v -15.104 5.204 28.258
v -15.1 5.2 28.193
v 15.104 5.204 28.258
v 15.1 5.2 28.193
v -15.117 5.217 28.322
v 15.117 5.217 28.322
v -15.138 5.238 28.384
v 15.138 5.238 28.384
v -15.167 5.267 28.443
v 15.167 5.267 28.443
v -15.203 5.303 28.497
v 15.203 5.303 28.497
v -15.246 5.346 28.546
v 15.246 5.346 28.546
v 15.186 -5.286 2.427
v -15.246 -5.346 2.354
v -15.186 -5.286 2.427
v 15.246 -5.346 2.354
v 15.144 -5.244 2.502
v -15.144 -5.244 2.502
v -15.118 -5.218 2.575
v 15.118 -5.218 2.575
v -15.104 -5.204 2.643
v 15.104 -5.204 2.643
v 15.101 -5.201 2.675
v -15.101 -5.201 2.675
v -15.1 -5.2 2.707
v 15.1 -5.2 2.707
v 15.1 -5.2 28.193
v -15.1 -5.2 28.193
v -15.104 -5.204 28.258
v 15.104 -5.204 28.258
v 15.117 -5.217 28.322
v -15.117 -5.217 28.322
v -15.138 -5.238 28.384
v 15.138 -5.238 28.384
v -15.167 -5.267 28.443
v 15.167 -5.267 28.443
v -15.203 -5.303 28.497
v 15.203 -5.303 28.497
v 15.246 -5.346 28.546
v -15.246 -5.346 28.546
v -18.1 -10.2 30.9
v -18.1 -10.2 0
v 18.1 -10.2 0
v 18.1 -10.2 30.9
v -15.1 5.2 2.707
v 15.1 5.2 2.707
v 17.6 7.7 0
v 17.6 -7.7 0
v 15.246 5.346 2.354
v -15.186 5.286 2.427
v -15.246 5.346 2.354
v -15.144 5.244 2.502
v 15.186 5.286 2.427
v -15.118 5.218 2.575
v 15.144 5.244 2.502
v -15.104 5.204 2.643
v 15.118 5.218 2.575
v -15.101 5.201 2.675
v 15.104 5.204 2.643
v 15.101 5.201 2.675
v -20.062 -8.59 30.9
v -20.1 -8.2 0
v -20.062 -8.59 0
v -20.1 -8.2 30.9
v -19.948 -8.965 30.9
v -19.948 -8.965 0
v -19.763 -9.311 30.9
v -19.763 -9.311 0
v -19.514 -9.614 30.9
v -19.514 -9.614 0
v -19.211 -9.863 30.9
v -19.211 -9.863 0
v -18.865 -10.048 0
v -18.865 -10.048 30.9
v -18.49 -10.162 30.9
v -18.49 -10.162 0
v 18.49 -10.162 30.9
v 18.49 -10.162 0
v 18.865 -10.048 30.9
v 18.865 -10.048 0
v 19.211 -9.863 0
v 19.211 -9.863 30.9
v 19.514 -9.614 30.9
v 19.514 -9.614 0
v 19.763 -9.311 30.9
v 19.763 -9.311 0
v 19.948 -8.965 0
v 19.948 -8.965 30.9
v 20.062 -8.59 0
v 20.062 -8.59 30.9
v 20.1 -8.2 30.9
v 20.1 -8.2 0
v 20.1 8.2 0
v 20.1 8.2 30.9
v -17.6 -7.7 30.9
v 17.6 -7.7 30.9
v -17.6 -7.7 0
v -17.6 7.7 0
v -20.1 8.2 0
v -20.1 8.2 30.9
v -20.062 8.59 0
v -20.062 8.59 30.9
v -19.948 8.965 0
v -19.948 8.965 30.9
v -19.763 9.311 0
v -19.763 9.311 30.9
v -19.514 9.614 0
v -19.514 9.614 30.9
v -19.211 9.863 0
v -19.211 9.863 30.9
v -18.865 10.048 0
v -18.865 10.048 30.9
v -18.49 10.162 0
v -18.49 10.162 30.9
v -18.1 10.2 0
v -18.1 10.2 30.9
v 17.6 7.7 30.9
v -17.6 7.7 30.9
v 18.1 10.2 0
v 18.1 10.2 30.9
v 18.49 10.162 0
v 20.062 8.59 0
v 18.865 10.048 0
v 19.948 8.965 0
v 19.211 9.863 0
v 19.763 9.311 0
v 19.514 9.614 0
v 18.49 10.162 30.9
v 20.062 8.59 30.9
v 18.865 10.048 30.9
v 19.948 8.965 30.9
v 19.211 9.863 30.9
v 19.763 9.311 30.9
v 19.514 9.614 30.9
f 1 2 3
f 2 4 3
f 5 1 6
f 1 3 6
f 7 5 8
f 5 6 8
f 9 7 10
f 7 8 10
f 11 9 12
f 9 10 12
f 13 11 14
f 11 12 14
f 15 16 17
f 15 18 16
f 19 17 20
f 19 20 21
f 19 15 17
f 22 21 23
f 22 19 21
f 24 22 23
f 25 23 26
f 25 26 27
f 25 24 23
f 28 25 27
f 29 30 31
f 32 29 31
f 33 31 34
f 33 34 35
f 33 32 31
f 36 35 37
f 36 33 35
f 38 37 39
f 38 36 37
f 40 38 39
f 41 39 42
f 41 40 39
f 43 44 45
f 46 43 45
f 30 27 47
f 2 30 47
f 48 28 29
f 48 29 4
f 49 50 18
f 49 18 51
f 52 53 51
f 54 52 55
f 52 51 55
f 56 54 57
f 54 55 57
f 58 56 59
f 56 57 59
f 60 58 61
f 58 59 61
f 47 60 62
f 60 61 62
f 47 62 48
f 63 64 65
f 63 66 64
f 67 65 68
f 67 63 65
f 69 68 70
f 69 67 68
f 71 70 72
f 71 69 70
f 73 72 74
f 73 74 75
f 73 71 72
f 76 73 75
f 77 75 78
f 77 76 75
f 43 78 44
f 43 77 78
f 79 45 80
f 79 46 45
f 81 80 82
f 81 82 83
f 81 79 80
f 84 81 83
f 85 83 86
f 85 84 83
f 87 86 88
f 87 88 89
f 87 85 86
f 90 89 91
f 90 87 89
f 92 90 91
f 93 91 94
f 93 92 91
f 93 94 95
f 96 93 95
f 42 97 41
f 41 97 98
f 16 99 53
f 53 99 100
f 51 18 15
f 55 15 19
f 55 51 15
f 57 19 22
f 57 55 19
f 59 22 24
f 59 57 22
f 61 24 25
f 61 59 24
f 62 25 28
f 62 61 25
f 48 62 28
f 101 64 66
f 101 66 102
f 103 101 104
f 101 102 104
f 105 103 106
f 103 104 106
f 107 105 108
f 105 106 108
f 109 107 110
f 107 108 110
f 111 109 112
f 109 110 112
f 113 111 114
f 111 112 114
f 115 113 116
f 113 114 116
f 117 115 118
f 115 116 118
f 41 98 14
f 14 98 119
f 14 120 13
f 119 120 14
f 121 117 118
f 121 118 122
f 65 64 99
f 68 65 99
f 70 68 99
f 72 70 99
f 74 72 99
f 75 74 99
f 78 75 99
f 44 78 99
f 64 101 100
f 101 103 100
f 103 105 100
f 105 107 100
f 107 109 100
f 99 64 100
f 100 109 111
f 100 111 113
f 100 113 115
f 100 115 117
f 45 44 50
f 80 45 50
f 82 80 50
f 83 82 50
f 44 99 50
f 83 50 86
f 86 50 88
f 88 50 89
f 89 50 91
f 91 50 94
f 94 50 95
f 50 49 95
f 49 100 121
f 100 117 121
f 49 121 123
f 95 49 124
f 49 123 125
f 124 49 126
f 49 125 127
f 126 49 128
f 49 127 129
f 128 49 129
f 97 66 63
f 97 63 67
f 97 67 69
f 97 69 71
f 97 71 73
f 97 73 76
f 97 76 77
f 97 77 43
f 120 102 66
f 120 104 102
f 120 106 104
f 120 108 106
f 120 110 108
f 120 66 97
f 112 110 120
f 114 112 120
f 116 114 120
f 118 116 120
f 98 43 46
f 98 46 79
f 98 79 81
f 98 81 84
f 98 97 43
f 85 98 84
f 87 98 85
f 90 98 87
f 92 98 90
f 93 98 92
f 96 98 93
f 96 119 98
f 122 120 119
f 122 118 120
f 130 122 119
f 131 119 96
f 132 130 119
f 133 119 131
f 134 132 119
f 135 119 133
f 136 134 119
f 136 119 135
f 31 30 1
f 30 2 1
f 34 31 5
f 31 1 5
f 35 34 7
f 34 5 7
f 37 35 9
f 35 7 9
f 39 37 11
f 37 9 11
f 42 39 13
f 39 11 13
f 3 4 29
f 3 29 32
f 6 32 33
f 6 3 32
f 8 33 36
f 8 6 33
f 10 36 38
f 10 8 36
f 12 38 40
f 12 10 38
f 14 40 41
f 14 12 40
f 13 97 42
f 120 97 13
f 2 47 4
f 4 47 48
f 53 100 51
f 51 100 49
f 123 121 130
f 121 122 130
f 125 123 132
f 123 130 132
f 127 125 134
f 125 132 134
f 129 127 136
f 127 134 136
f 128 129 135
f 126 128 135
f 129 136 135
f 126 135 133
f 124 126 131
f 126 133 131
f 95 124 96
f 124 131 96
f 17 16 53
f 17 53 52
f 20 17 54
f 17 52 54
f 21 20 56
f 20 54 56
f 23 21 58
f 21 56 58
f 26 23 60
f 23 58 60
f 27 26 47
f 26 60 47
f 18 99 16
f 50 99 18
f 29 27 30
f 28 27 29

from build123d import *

# Parameters (mm, degrees)
F0_W     = 40.2
F0_H     = 20.4
F0_W_2   = 30.2
F0_H_2   = 10.4
F1_DEPTH = 30.9
F2_SIZE  = 2.5
F3_R     = 2
F4_R     = 0.5


with BuildPart() as f1:
    # F0 (on Top) → F1 (new body)
    with BuildSketch(Plane.XY):
        Rectangle(F0_W, F0_H)
        Rectangle(F0_W_2, F0_H_2, mode=Mode.SUBTRACT)
    extrude(amount=F1_DEPTH)

    # F2
    f2_edges = [f1.edges().sort_by_distance(p)[0] for p in [
        (-15.1, 0, 0),
        (0, -5.2, 0),
        (15.1, 0, 0),
        (0, 5.2, 0),
        (-15.1, 0, 30.9),
        (0, 5.2, 30.9),
        (15.1, 0, 30.9),
        (0, -5.2, 30.9),
    ]]
    chamfer(f2_edges, length=F2_SIZE)

    # F3
    f3_edges = [f1.edges().sort_by_distance(p)[0] for p in [
        (-20.1, -10.2, 15.45),
        (-20.1, 10.2, 15.45),
        (20.1, -10.2, 15.45),
        (20.1, 10.2, 15.45),
    ]]
    fillet(f3_edges, radius=F3_R)

    # F4
    f4_edges = [f1.edges().sort_by_distance(p)[0] for p in [
        (-15.1, 0, 28.4),
        (0, 5.2, 28.4),
        (15.1, 0, 28.4),
        (0, -5.2, 28.4),
        (0, 5.2, 2.5),
        (-15.1, 0, 2.5),
        (15.1, 0, 2.5),
        (0, -5.2, 2.5),
    ]]
    fillet(f4_edges, radius=F4_R)


solid = f1.part
